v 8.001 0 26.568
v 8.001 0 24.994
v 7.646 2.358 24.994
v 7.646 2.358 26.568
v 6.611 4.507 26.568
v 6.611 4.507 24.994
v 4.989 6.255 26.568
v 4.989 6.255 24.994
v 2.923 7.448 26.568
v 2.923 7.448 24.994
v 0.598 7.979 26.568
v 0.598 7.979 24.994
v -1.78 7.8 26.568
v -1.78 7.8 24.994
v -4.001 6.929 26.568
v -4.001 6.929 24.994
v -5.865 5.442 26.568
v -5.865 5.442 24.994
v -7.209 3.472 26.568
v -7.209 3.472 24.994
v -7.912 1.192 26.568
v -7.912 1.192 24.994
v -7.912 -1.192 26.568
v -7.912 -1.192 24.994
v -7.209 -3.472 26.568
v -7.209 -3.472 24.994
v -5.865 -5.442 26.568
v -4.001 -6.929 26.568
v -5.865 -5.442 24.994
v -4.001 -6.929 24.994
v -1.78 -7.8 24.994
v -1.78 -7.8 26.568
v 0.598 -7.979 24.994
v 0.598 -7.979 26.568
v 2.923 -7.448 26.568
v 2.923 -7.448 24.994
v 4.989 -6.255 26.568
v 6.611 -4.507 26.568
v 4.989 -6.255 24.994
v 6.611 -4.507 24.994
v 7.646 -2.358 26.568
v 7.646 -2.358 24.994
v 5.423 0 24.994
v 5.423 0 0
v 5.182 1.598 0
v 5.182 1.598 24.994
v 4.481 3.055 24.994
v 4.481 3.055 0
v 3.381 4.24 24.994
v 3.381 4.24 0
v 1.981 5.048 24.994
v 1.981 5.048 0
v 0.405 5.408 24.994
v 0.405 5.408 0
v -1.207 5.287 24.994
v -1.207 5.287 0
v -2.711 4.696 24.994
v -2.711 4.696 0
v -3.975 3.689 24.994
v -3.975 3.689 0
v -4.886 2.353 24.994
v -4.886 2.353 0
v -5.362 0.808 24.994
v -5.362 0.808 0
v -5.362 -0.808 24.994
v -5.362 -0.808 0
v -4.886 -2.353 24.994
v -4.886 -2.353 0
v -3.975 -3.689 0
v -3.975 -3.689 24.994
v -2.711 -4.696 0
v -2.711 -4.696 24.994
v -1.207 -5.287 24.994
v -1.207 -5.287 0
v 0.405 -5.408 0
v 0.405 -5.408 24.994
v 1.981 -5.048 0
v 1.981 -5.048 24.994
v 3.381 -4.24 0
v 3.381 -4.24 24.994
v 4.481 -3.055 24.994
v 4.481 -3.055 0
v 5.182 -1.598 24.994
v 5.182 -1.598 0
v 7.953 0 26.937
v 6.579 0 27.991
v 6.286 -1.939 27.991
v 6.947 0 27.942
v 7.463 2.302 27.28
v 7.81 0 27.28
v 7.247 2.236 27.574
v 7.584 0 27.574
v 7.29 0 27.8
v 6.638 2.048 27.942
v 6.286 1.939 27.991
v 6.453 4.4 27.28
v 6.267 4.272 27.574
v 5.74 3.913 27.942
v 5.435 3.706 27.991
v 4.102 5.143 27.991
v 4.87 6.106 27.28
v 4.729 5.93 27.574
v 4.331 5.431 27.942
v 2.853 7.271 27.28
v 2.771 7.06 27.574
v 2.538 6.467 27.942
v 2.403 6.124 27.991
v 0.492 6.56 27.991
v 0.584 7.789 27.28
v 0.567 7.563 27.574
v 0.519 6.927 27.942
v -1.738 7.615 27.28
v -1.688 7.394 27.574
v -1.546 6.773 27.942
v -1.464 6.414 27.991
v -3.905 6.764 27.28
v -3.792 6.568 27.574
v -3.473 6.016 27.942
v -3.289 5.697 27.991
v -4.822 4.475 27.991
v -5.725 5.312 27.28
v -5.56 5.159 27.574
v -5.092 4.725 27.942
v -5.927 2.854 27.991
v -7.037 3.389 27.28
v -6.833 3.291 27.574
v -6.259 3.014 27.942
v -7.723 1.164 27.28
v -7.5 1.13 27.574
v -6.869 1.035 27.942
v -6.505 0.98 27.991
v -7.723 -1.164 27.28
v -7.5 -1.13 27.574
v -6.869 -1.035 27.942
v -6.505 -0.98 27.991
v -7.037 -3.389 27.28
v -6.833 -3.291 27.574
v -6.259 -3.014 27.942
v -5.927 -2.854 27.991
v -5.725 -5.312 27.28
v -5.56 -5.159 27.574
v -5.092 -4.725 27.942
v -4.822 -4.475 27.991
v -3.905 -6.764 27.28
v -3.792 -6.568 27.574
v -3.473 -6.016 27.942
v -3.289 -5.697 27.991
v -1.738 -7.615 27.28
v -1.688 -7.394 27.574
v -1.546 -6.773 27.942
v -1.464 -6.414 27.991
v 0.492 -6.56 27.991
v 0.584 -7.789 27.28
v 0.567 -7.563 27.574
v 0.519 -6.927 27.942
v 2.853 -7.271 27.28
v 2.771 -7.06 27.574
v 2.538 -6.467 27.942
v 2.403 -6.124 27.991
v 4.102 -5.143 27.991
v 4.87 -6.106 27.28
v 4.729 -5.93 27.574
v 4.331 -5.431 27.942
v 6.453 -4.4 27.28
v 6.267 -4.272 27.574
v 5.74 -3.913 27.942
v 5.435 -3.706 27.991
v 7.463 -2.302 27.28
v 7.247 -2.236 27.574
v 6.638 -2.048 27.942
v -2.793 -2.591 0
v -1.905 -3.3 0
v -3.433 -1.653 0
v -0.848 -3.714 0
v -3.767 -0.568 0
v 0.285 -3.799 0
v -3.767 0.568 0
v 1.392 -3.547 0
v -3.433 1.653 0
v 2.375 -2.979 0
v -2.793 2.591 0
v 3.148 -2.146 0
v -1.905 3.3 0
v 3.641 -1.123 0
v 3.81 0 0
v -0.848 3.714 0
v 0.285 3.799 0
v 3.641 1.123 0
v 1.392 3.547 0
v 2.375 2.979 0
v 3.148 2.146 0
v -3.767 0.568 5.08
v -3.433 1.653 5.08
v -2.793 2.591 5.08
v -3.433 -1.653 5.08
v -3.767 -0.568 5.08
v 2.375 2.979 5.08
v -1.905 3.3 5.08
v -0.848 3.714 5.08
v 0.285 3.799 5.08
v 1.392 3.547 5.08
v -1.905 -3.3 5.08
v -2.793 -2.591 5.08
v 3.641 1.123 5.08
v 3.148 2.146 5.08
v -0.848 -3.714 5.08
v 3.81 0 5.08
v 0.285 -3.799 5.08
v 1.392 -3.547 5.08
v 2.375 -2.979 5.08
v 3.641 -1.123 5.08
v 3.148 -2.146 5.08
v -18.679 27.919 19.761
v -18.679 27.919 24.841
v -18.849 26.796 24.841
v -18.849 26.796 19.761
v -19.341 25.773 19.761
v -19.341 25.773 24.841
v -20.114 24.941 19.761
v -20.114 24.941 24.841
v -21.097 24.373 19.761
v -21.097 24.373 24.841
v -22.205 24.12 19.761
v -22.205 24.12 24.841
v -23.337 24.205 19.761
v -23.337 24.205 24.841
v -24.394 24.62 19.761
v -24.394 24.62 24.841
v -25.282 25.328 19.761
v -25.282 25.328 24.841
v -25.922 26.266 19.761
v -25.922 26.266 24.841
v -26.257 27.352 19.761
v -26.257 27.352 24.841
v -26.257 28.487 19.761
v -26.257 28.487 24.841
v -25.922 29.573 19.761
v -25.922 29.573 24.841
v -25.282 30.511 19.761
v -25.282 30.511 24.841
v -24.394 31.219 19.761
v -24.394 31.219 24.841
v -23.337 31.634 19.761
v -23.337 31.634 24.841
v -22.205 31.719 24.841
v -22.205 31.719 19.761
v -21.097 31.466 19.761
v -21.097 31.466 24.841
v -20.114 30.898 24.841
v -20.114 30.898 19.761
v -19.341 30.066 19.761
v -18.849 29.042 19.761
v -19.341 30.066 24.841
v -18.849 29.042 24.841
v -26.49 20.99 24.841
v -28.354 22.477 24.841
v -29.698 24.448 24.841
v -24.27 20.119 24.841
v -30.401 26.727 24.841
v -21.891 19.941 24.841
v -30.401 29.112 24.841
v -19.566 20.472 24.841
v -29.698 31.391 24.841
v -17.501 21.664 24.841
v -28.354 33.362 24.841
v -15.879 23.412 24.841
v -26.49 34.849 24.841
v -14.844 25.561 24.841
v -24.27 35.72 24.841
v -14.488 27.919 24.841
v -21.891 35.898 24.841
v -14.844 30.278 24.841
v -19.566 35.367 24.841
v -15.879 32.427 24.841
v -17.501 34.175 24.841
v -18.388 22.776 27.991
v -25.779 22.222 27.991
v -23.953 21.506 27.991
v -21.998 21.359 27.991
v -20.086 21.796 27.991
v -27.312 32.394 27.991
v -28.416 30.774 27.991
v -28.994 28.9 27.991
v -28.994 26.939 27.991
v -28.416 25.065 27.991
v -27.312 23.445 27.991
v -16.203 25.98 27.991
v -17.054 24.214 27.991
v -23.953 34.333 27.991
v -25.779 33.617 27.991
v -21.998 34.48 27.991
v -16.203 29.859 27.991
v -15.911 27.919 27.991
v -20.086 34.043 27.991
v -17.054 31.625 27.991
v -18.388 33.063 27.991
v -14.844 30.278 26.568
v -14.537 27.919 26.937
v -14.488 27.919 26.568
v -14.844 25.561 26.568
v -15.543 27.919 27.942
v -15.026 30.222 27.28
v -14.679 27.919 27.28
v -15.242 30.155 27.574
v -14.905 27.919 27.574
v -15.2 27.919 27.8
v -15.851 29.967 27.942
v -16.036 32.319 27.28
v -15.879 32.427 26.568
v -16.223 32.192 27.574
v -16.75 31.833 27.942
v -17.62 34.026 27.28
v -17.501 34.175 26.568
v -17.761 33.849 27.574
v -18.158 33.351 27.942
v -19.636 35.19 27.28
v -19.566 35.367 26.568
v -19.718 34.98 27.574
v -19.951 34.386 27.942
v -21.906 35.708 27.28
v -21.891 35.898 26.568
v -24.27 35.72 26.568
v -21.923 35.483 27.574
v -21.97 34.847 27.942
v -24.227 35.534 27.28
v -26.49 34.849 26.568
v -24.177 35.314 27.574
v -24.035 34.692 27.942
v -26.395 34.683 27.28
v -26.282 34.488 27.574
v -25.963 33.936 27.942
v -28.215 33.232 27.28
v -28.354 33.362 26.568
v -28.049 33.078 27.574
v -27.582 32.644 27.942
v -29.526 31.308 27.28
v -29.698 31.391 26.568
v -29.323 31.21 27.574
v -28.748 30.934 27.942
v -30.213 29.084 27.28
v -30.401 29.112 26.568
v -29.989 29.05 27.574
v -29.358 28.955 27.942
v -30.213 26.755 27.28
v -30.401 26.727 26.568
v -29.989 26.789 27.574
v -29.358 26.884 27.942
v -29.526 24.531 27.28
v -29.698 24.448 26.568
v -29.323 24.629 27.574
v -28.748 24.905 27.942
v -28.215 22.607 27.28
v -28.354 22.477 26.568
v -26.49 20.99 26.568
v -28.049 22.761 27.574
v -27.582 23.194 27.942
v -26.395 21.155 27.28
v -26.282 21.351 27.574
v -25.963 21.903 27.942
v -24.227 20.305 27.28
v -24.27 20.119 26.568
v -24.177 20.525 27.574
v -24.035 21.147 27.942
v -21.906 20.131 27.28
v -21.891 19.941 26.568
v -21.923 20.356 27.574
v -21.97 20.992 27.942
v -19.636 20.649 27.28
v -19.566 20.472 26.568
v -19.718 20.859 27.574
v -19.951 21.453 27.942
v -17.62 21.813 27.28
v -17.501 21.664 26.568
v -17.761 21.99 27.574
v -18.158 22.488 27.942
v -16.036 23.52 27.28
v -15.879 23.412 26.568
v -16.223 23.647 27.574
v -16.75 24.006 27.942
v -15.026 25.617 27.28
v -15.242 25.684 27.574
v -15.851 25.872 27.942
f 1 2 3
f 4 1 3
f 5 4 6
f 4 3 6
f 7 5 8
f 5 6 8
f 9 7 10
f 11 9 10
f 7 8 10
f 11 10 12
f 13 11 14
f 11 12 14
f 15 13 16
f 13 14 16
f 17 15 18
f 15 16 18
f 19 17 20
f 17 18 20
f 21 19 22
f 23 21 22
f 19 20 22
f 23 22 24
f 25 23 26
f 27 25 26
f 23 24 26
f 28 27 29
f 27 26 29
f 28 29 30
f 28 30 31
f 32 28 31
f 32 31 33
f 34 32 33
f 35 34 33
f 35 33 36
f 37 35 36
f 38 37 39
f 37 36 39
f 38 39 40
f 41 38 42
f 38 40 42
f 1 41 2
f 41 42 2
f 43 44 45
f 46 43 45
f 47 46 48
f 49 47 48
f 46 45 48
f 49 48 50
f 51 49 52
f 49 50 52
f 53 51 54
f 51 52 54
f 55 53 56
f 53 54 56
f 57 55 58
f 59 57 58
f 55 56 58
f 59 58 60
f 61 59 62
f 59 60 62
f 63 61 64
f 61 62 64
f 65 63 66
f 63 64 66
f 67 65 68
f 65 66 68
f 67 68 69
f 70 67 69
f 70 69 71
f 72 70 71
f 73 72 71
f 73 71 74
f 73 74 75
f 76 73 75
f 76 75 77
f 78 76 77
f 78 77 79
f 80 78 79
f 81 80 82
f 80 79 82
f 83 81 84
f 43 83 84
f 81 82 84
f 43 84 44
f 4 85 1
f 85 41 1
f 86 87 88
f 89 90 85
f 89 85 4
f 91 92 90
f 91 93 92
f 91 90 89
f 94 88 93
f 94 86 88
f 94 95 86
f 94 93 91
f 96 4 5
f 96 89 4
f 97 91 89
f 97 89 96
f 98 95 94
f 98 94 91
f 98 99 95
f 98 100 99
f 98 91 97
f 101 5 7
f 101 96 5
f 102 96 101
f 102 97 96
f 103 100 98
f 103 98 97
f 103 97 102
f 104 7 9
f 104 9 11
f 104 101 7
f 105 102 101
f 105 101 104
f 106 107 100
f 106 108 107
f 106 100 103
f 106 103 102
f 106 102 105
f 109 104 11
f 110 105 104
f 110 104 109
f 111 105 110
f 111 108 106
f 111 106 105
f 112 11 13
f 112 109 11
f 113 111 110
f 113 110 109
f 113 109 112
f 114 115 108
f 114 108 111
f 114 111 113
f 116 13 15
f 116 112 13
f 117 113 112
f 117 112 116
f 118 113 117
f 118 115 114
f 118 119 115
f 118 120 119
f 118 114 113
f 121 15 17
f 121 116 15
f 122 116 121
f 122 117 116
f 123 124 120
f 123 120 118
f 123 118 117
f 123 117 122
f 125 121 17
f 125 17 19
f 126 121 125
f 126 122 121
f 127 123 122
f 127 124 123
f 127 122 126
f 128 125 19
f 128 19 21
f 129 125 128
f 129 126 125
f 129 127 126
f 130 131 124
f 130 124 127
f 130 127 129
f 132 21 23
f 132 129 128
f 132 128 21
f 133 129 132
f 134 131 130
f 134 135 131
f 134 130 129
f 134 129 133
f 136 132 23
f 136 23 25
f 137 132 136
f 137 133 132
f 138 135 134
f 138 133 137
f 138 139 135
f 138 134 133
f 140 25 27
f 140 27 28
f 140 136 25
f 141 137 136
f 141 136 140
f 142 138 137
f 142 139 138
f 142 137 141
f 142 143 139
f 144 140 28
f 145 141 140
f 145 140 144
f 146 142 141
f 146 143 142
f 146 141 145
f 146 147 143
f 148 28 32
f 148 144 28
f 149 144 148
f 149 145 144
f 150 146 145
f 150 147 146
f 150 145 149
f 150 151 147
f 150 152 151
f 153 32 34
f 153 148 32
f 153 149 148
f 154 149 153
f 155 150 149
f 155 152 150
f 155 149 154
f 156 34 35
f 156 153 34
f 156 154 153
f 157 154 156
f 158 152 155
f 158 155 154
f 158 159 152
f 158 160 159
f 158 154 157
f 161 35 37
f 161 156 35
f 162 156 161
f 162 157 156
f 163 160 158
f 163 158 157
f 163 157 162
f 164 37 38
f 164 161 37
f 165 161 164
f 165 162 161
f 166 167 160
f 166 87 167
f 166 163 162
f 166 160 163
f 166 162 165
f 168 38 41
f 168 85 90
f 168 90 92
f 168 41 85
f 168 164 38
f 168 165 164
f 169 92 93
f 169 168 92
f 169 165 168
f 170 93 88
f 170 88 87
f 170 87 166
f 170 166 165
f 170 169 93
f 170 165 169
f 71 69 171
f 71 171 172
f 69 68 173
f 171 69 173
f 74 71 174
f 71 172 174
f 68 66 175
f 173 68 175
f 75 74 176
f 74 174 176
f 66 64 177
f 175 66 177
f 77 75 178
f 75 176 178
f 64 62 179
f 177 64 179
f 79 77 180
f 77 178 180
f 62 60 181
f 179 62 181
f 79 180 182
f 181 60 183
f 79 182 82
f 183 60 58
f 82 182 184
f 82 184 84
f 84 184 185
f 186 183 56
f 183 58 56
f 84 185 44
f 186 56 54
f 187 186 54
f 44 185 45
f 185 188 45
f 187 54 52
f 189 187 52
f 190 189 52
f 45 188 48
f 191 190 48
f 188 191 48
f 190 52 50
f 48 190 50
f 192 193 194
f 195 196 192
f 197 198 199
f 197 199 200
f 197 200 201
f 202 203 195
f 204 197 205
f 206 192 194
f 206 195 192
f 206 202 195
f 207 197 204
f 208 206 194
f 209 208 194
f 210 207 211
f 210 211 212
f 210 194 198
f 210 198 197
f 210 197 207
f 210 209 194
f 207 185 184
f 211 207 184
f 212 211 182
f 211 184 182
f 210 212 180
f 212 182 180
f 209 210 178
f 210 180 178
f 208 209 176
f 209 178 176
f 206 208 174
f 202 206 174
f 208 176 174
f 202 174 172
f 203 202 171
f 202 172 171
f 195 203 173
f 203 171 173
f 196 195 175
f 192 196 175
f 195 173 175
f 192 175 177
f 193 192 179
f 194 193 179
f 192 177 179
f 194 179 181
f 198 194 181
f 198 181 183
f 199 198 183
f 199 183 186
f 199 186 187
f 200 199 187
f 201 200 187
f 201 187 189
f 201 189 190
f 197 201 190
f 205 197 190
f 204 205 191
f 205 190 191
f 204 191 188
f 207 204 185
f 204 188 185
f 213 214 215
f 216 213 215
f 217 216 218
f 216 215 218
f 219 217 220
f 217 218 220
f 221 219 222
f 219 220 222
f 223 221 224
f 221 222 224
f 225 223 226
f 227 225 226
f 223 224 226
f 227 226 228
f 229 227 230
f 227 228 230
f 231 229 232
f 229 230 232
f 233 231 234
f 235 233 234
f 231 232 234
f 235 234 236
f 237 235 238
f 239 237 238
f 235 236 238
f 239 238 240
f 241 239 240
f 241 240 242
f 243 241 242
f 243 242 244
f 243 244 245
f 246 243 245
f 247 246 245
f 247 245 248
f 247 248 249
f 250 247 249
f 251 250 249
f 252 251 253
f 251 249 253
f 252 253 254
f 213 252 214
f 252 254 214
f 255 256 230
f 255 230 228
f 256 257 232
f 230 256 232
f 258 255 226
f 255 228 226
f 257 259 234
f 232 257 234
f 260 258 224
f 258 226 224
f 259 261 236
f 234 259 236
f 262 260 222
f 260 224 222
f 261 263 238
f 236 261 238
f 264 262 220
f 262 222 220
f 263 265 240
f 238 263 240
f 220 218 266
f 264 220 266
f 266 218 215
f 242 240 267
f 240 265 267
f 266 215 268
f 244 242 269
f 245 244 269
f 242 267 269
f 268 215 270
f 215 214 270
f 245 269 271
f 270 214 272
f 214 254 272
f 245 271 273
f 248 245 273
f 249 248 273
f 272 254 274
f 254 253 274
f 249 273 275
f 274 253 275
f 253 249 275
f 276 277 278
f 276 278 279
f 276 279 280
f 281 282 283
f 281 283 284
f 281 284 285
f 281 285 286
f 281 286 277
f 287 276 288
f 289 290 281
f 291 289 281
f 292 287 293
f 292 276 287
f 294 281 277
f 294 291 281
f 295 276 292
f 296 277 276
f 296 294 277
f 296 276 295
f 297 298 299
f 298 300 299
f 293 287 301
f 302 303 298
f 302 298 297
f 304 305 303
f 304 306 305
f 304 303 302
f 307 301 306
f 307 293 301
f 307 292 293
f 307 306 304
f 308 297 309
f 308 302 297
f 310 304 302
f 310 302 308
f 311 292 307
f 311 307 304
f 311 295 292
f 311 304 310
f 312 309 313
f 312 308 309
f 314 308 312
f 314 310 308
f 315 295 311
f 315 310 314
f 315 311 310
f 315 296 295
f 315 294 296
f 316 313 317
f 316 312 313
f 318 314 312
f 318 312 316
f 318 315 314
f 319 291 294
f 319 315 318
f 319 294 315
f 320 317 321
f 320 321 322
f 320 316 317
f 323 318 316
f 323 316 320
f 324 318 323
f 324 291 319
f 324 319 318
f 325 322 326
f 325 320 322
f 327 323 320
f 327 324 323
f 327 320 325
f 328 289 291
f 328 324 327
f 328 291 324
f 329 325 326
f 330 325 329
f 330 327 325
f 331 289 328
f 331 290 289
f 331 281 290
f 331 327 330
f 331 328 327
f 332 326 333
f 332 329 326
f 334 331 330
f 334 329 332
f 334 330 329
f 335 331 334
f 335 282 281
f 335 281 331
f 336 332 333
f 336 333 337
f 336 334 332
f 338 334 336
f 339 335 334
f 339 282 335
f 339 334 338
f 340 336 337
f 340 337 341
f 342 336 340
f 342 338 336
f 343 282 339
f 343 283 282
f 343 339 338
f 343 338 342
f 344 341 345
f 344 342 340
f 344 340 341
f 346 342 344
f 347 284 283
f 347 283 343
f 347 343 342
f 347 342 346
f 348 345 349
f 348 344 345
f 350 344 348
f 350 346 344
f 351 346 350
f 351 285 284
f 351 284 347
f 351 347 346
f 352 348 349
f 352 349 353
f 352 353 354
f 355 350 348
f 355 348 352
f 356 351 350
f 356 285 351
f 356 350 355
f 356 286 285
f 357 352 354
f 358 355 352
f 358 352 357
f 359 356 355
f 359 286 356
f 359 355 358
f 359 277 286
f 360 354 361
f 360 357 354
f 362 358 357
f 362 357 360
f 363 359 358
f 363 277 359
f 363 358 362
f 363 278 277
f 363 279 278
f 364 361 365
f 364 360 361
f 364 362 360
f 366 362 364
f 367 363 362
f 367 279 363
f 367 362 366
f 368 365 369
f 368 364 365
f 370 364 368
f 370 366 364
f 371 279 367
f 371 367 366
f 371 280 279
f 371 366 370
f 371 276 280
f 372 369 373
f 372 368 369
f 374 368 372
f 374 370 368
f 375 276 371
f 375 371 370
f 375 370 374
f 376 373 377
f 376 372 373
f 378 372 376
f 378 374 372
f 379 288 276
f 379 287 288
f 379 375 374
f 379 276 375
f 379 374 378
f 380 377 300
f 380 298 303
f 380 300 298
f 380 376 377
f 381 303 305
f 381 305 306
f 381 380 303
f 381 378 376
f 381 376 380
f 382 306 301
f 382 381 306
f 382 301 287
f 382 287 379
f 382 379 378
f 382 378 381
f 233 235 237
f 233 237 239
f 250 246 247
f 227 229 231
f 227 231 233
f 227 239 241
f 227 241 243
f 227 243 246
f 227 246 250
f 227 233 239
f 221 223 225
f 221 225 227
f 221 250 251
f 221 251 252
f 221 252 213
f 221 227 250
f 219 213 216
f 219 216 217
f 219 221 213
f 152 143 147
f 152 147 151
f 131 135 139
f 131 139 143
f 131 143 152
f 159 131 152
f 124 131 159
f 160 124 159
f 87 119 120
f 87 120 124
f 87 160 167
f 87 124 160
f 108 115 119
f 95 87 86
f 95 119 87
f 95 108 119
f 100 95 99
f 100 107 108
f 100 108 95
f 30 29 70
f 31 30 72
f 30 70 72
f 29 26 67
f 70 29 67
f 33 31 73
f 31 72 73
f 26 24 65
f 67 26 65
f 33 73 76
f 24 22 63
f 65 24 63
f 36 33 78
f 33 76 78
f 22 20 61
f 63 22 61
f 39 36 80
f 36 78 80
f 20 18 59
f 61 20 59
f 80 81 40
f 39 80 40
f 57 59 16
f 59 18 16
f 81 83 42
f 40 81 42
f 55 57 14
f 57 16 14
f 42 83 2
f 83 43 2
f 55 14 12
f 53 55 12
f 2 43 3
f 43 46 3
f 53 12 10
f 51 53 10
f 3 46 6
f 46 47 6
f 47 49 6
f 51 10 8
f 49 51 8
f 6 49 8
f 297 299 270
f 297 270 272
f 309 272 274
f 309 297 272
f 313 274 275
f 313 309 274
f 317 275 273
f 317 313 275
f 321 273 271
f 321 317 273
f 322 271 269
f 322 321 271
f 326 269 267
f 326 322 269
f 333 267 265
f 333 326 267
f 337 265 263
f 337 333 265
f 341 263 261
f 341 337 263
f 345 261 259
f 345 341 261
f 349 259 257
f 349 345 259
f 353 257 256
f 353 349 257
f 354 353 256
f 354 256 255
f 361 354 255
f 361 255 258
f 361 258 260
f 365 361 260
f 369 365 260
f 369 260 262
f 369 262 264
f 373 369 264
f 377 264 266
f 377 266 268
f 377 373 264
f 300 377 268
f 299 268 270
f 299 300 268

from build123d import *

# Parameters (mm, degrees)
F0_R      = 5.4229
F1_DEPTH  = 24.9936
F2_R      = 8.001
F3_DEPTH  = 2.9972
F4_R      = 1.4224
F6_R      = 3.81
F7_DEPTH  = 5.08
F8_R      = 8.001
F9_DEPTH  = 3.1496
F10_R     = 3.81
F11_DEPTH = 5.08
F12_R     = 1.4224


with BuildPart() as f1:
    # F0 (on Top) → F1 (new body)
    with BuildSketch(Plane.XY):
        Circle(F0_R)
    extrude(amount=F1_DEPTH)

    # F2 (on face) → F3 (join)
    with BuildSketch(Plane.XY.offset(24.9936)):
        Circle(F2_R)
    extrude(amount=F3_DEPTH)

    # F4
    f4_edges = [f1.edges().sort_by_distance(p)[0] for p in [
        (-8.001, 0, 27.9908),
    ]]
    fillet(f4_edges, radius=F4_R)

    # F6 (on face) → F7 (cut)
    with BuildSketch(Plane(origin=(0, 0, 0), x_dir=(1, 0, 0), z_dir=(0, 0, -1))):
        Circle(F6_R)
    extrude(amount=-F7_DEPTH, mode=Mode.SUBTRACT)


with BuildPart() as f9:
    # F8 (on offset) → F9 (new body)
    with BuildSketch(Plane.XY.offset(27.9908)):
        with Locations((-22.489315, 27.919449)):
            Circle(F8_R)
    extrude(amount=-F9_DEPTH)

    # F10 (on face) → F11 (join)
    with BuildSketch(Plane(origin=(0, 0, 24.8412), x_dir=(1, 0, 0), z_dir=(0, 0, -1))):
        with Locations((-22.489315, -27.919449)):
            Circle(F10_R)
    extrude(amount=F11_DEPTH)

    # F12
    f12_edges = [f9.edges().sort_by_distance(p)[0] for p in [
        (-30.490315, 27.919449, 27.9908),
    ]]
    fillet(f12_edges, radius=F12_R)


solid = Compound([f1.part, f9.part])
